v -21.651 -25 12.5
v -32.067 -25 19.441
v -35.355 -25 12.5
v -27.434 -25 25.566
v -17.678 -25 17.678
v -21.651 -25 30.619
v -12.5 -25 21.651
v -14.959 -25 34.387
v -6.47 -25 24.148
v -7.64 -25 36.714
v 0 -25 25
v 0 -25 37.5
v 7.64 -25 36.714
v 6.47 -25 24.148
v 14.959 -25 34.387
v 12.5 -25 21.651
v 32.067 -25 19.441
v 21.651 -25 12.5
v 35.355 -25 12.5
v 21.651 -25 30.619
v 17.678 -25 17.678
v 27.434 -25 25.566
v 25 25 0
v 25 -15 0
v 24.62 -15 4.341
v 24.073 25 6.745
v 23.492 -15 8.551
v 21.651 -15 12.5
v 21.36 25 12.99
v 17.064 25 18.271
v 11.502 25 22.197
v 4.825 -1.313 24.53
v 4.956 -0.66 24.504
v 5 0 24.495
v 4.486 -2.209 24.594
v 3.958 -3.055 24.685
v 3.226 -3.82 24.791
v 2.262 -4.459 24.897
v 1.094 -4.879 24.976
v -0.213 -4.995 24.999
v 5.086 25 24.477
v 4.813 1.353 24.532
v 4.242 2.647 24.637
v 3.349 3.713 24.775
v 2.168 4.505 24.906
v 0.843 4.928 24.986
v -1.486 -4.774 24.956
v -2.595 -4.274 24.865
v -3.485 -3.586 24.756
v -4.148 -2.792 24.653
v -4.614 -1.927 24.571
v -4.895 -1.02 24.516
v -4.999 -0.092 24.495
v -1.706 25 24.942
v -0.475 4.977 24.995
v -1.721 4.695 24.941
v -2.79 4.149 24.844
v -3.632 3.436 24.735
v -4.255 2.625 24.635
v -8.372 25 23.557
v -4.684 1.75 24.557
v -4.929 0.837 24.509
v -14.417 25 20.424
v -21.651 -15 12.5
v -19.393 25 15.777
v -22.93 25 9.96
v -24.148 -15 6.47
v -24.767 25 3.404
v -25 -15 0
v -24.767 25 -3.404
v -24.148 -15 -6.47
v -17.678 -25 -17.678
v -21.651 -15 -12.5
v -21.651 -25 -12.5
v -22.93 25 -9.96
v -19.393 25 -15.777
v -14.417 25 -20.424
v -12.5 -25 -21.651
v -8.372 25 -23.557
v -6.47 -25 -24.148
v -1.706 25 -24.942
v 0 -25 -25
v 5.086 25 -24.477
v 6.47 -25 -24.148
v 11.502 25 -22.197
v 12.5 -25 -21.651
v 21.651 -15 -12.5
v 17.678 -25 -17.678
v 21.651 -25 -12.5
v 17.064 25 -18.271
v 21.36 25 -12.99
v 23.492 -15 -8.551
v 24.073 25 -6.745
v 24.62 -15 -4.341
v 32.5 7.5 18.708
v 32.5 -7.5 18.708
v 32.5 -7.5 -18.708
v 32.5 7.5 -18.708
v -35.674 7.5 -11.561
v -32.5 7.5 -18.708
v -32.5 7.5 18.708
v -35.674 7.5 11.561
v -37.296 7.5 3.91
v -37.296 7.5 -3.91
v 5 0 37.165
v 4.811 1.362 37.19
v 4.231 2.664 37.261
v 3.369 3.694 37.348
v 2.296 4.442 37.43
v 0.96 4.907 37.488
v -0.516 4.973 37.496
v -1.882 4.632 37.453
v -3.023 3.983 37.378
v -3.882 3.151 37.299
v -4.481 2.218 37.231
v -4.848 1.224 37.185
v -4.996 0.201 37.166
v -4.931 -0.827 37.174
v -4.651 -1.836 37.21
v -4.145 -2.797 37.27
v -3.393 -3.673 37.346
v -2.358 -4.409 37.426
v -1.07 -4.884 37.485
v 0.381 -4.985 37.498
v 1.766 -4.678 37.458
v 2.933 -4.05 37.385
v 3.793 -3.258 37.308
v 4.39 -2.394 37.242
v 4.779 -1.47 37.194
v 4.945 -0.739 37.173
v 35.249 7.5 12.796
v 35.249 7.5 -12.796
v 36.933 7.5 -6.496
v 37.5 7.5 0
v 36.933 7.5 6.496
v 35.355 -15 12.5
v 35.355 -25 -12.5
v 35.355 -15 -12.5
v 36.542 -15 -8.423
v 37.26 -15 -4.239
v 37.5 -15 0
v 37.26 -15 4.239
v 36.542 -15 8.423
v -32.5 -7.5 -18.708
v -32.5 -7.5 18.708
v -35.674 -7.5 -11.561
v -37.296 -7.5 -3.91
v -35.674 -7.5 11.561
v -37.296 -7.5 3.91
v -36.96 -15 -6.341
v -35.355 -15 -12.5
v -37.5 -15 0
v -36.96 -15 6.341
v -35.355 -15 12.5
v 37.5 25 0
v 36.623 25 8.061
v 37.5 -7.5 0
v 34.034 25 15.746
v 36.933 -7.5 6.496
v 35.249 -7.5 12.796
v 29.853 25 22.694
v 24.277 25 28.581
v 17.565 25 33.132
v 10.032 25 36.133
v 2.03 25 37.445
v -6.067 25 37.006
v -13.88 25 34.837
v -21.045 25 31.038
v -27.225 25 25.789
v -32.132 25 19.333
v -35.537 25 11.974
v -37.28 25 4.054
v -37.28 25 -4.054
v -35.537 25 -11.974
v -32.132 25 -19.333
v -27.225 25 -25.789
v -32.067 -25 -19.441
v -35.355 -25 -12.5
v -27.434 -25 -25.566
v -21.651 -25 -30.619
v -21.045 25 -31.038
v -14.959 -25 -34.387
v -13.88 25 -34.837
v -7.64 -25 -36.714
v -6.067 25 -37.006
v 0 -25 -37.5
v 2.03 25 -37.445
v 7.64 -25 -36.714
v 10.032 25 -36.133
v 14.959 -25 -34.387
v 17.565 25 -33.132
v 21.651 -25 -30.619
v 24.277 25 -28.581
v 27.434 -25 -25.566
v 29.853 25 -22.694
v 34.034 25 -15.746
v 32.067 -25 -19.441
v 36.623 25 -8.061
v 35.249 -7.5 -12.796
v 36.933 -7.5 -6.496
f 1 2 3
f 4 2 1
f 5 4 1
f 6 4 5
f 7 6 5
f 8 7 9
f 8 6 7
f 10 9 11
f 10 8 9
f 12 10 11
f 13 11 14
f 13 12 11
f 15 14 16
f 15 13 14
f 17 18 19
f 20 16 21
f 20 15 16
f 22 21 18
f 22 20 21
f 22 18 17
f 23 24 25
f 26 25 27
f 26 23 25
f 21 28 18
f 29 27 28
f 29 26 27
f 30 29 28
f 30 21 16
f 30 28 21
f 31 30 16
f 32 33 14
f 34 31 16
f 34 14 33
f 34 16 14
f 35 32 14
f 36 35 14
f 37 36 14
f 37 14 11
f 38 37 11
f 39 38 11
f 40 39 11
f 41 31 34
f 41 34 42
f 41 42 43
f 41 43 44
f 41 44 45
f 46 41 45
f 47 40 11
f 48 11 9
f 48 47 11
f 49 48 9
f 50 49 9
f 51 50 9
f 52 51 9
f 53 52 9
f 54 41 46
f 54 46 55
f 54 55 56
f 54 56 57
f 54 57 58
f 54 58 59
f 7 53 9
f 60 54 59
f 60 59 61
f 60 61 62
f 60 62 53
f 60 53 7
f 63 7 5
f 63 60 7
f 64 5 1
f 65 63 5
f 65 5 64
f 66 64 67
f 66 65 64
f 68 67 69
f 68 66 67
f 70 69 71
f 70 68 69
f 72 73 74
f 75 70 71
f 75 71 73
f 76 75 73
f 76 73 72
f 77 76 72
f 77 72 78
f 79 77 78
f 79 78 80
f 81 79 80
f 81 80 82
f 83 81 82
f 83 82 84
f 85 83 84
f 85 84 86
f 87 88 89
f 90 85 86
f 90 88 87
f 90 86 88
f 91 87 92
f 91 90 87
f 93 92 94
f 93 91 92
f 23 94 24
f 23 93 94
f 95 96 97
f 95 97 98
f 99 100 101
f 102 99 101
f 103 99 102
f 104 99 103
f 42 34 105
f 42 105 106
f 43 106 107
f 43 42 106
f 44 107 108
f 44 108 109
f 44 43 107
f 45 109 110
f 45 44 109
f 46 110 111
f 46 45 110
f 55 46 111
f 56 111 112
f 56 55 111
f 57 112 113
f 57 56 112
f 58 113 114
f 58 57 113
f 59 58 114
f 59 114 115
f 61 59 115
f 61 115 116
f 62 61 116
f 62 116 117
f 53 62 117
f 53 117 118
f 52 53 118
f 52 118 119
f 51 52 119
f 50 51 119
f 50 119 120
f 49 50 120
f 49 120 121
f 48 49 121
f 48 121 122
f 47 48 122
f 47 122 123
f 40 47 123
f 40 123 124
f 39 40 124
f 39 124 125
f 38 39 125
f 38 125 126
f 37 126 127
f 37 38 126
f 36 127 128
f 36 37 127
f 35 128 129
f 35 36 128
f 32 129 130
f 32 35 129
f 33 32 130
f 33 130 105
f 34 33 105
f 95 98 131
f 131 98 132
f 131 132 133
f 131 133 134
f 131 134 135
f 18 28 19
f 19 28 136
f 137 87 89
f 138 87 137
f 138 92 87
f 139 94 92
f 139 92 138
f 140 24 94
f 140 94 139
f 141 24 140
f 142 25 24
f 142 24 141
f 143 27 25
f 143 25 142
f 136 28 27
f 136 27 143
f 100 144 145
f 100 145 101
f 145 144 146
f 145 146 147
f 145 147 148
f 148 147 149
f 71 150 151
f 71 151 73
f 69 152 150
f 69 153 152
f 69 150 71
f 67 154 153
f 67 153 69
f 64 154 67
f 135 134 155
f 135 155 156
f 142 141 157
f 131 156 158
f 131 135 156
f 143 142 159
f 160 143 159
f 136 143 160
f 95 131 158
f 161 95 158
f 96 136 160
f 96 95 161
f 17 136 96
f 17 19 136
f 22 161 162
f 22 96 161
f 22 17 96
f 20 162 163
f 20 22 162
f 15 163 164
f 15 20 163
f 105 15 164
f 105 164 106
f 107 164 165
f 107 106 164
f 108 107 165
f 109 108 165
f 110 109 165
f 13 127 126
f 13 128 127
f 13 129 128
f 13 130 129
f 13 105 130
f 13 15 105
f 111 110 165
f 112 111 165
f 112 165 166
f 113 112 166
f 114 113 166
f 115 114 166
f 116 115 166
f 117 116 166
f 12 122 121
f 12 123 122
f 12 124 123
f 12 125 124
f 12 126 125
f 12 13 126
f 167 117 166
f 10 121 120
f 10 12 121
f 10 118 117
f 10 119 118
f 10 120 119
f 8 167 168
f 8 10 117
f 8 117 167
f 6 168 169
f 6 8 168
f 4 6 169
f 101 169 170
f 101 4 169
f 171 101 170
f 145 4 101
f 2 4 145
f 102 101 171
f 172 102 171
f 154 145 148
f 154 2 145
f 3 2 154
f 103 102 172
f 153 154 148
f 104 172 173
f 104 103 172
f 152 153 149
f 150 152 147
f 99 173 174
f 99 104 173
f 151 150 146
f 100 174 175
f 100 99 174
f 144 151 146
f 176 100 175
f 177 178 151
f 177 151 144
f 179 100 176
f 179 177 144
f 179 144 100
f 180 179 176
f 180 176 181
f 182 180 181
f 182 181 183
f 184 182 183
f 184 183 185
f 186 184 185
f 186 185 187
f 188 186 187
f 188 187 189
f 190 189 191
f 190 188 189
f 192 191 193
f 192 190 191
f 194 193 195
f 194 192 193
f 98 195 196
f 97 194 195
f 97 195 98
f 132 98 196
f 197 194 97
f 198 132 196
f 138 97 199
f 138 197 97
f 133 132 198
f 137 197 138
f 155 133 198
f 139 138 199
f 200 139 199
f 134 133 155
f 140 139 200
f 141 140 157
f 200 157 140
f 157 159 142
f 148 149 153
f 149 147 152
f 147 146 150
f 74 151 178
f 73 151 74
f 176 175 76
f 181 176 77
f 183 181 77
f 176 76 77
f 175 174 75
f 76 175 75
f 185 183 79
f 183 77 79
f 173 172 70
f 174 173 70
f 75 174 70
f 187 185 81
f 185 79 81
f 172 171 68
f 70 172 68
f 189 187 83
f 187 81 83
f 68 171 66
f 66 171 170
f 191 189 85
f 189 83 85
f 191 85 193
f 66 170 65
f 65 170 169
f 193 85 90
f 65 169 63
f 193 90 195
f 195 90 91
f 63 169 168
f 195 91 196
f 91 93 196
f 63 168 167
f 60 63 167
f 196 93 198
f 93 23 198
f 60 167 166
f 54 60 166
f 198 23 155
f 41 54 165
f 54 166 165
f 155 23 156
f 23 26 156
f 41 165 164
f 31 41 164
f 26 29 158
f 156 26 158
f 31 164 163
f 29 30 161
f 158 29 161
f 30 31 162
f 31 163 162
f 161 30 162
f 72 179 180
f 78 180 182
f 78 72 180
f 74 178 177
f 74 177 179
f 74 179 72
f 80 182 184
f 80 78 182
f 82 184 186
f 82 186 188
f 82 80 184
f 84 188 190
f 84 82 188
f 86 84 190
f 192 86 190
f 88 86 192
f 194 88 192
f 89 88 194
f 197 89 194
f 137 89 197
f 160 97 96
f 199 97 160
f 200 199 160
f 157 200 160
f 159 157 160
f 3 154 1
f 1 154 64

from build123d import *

# Parameters (mm, degrees)
F0_R     = 37.5
F0_R_2   = 25
F1_DEPTH = 25
F2_R     = 5
F3_DEPTH = 37.501
F2_W     = 5
F2_H     = 15
F4_DEPTH = 37.5
F2_W_2   = 75
F2_H_2   = 10
F5_DEPTH = 12.5


with BuildPart() as f1:
    # F0 (on Front) → F1 (new body, symmetric)
    with BuildSketch(Plane.XZ):
        Circle(F0_R)
        Circle(F0_R_2, mode=Mode.SUBTRACT)
    extrude(amount=F1_DEPTH, both=True)

    # F2 (on Top) → F3 (cut, through all)
    with BuildSketch(Plane.XY):
        Circle(F2_R)
    extrude(amount=F3_DEPTH, mode=Mode.SUBTRACT)

    # F2 (on Top) → F4 (cut, symmetric)
    with BuildSketch(Plane.XY):
        with Locations((-35, 0)):
            Rectangle(F2_W, F2_H)
        with Locations((35, 0)):
            Rectangle(F2_W, F2_H)
    extrude(amount=F4_DEPTH, both=True, mode=Mode.SUBTRACT)

    # F2 (on Top) → F5 (cut, symmetric)
    with BuildSketch(Plane.XY):
        with Locations((0, -20)):
            Rectangle(F2_W_2, F2_H_2)
    extrude(amount=F5_DEPTH, both=True, mode=Mode.SUBTRACT)


solid = f1.part
